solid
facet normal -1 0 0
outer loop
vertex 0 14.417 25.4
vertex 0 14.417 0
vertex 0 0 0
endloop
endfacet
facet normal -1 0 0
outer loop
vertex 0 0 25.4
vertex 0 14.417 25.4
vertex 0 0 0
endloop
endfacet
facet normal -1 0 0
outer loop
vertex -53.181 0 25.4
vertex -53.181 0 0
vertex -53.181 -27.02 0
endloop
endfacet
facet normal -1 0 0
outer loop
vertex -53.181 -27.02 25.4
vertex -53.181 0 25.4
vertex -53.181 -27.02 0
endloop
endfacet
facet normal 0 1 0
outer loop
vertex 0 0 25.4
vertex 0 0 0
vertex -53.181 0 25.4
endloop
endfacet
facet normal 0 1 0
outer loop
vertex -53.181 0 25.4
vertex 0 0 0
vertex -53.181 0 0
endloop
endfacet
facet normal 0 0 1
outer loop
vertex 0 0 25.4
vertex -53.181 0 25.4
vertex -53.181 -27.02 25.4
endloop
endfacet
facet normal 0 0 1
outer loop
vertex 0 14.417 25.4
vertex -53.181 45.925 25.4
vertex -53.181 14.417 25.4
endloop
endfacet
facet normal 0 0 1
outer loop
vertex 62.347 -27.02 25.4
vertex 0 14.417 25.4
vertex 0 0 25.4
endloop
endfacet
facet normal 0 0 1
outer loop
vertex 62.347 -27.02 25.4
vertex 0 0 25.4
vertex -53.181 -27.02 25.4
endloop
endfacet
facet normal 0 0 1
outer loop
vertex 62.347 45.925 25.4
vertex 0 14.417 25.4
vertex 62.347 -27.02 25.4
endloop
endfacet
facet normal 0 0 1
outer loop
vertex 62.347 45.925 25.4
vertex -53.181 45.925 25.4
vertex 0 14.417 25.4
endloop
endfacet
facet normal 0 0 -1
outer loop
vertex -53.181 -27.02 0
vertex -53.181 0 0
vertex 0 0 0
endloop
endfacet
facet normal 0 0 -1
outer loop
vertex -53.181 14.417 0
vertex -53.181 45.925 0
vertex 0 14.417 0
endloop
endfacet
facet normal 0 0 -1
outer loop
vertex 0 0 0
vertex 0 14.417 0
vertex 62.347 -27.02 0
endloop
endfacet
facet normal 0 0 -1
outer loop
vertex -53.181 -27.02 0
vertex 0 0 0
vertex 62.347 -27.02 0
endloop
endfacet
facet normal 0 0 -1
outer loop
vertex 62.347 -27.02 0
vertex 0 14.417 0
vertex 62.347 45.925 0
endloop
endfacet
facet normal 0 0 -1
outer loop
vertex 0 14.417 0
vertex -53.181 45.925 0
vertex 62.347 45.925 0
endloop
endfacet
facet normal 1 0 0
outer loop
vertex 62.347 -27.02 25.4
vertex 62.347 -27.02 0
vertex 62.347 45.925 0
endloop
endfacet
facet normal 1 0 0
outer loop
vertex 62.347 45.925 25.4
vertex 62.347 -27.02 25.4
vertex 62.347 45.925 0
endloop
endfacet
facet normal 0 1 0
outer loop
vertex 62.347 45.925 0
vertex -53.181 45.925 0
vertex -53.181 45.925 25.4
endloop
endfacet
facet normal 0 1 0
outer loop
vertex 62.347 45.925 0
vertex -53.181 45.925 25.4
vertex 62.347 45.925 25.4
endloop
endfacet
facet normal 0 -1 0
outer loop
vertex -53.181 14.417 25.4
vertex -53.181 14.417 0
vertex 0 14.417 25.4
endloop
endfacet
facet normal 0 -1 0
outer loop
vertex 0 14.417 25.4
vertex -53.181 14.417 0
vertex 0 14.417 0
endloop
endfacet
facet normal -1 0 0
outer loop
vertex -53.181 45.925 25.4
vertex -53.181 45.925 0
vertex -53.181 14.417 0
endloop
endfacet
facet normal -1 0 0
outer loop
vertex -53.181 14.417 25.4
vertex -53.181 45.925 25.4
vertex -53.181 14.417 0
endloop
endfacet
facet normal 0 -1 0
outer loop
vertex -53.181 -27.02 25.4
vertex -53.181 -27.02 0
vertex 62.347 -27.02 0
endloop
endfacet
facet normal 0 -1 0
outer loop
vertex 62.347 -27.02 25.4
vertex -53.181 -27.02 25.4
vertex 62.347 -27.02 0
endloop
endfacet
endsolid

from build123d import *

# Parameters (mm, degrees)
F0_W     = 115.52757
F0_H     = 0.190954
F1_DEPTH = 25.4


with BuildPart() as f1:
    # F0 (on Top) → F1 (new body)
    with BuildSketch(Plane.XY):
        with Locations((4.582912, 45.829119)):
            Rectangle(F0_W, F0_H)
        Polygon((62.346697, 45.733642), (-53.180873, 45.733642), (-53.180873, 14.417076), (0, 14.417076), (0, 0), (-53.180873, 0), (-53.180873, -27.020084), (62.346697, -27.020084), align=None)
    extrude(amount=F1_DEPTH)


solid = f1.part
